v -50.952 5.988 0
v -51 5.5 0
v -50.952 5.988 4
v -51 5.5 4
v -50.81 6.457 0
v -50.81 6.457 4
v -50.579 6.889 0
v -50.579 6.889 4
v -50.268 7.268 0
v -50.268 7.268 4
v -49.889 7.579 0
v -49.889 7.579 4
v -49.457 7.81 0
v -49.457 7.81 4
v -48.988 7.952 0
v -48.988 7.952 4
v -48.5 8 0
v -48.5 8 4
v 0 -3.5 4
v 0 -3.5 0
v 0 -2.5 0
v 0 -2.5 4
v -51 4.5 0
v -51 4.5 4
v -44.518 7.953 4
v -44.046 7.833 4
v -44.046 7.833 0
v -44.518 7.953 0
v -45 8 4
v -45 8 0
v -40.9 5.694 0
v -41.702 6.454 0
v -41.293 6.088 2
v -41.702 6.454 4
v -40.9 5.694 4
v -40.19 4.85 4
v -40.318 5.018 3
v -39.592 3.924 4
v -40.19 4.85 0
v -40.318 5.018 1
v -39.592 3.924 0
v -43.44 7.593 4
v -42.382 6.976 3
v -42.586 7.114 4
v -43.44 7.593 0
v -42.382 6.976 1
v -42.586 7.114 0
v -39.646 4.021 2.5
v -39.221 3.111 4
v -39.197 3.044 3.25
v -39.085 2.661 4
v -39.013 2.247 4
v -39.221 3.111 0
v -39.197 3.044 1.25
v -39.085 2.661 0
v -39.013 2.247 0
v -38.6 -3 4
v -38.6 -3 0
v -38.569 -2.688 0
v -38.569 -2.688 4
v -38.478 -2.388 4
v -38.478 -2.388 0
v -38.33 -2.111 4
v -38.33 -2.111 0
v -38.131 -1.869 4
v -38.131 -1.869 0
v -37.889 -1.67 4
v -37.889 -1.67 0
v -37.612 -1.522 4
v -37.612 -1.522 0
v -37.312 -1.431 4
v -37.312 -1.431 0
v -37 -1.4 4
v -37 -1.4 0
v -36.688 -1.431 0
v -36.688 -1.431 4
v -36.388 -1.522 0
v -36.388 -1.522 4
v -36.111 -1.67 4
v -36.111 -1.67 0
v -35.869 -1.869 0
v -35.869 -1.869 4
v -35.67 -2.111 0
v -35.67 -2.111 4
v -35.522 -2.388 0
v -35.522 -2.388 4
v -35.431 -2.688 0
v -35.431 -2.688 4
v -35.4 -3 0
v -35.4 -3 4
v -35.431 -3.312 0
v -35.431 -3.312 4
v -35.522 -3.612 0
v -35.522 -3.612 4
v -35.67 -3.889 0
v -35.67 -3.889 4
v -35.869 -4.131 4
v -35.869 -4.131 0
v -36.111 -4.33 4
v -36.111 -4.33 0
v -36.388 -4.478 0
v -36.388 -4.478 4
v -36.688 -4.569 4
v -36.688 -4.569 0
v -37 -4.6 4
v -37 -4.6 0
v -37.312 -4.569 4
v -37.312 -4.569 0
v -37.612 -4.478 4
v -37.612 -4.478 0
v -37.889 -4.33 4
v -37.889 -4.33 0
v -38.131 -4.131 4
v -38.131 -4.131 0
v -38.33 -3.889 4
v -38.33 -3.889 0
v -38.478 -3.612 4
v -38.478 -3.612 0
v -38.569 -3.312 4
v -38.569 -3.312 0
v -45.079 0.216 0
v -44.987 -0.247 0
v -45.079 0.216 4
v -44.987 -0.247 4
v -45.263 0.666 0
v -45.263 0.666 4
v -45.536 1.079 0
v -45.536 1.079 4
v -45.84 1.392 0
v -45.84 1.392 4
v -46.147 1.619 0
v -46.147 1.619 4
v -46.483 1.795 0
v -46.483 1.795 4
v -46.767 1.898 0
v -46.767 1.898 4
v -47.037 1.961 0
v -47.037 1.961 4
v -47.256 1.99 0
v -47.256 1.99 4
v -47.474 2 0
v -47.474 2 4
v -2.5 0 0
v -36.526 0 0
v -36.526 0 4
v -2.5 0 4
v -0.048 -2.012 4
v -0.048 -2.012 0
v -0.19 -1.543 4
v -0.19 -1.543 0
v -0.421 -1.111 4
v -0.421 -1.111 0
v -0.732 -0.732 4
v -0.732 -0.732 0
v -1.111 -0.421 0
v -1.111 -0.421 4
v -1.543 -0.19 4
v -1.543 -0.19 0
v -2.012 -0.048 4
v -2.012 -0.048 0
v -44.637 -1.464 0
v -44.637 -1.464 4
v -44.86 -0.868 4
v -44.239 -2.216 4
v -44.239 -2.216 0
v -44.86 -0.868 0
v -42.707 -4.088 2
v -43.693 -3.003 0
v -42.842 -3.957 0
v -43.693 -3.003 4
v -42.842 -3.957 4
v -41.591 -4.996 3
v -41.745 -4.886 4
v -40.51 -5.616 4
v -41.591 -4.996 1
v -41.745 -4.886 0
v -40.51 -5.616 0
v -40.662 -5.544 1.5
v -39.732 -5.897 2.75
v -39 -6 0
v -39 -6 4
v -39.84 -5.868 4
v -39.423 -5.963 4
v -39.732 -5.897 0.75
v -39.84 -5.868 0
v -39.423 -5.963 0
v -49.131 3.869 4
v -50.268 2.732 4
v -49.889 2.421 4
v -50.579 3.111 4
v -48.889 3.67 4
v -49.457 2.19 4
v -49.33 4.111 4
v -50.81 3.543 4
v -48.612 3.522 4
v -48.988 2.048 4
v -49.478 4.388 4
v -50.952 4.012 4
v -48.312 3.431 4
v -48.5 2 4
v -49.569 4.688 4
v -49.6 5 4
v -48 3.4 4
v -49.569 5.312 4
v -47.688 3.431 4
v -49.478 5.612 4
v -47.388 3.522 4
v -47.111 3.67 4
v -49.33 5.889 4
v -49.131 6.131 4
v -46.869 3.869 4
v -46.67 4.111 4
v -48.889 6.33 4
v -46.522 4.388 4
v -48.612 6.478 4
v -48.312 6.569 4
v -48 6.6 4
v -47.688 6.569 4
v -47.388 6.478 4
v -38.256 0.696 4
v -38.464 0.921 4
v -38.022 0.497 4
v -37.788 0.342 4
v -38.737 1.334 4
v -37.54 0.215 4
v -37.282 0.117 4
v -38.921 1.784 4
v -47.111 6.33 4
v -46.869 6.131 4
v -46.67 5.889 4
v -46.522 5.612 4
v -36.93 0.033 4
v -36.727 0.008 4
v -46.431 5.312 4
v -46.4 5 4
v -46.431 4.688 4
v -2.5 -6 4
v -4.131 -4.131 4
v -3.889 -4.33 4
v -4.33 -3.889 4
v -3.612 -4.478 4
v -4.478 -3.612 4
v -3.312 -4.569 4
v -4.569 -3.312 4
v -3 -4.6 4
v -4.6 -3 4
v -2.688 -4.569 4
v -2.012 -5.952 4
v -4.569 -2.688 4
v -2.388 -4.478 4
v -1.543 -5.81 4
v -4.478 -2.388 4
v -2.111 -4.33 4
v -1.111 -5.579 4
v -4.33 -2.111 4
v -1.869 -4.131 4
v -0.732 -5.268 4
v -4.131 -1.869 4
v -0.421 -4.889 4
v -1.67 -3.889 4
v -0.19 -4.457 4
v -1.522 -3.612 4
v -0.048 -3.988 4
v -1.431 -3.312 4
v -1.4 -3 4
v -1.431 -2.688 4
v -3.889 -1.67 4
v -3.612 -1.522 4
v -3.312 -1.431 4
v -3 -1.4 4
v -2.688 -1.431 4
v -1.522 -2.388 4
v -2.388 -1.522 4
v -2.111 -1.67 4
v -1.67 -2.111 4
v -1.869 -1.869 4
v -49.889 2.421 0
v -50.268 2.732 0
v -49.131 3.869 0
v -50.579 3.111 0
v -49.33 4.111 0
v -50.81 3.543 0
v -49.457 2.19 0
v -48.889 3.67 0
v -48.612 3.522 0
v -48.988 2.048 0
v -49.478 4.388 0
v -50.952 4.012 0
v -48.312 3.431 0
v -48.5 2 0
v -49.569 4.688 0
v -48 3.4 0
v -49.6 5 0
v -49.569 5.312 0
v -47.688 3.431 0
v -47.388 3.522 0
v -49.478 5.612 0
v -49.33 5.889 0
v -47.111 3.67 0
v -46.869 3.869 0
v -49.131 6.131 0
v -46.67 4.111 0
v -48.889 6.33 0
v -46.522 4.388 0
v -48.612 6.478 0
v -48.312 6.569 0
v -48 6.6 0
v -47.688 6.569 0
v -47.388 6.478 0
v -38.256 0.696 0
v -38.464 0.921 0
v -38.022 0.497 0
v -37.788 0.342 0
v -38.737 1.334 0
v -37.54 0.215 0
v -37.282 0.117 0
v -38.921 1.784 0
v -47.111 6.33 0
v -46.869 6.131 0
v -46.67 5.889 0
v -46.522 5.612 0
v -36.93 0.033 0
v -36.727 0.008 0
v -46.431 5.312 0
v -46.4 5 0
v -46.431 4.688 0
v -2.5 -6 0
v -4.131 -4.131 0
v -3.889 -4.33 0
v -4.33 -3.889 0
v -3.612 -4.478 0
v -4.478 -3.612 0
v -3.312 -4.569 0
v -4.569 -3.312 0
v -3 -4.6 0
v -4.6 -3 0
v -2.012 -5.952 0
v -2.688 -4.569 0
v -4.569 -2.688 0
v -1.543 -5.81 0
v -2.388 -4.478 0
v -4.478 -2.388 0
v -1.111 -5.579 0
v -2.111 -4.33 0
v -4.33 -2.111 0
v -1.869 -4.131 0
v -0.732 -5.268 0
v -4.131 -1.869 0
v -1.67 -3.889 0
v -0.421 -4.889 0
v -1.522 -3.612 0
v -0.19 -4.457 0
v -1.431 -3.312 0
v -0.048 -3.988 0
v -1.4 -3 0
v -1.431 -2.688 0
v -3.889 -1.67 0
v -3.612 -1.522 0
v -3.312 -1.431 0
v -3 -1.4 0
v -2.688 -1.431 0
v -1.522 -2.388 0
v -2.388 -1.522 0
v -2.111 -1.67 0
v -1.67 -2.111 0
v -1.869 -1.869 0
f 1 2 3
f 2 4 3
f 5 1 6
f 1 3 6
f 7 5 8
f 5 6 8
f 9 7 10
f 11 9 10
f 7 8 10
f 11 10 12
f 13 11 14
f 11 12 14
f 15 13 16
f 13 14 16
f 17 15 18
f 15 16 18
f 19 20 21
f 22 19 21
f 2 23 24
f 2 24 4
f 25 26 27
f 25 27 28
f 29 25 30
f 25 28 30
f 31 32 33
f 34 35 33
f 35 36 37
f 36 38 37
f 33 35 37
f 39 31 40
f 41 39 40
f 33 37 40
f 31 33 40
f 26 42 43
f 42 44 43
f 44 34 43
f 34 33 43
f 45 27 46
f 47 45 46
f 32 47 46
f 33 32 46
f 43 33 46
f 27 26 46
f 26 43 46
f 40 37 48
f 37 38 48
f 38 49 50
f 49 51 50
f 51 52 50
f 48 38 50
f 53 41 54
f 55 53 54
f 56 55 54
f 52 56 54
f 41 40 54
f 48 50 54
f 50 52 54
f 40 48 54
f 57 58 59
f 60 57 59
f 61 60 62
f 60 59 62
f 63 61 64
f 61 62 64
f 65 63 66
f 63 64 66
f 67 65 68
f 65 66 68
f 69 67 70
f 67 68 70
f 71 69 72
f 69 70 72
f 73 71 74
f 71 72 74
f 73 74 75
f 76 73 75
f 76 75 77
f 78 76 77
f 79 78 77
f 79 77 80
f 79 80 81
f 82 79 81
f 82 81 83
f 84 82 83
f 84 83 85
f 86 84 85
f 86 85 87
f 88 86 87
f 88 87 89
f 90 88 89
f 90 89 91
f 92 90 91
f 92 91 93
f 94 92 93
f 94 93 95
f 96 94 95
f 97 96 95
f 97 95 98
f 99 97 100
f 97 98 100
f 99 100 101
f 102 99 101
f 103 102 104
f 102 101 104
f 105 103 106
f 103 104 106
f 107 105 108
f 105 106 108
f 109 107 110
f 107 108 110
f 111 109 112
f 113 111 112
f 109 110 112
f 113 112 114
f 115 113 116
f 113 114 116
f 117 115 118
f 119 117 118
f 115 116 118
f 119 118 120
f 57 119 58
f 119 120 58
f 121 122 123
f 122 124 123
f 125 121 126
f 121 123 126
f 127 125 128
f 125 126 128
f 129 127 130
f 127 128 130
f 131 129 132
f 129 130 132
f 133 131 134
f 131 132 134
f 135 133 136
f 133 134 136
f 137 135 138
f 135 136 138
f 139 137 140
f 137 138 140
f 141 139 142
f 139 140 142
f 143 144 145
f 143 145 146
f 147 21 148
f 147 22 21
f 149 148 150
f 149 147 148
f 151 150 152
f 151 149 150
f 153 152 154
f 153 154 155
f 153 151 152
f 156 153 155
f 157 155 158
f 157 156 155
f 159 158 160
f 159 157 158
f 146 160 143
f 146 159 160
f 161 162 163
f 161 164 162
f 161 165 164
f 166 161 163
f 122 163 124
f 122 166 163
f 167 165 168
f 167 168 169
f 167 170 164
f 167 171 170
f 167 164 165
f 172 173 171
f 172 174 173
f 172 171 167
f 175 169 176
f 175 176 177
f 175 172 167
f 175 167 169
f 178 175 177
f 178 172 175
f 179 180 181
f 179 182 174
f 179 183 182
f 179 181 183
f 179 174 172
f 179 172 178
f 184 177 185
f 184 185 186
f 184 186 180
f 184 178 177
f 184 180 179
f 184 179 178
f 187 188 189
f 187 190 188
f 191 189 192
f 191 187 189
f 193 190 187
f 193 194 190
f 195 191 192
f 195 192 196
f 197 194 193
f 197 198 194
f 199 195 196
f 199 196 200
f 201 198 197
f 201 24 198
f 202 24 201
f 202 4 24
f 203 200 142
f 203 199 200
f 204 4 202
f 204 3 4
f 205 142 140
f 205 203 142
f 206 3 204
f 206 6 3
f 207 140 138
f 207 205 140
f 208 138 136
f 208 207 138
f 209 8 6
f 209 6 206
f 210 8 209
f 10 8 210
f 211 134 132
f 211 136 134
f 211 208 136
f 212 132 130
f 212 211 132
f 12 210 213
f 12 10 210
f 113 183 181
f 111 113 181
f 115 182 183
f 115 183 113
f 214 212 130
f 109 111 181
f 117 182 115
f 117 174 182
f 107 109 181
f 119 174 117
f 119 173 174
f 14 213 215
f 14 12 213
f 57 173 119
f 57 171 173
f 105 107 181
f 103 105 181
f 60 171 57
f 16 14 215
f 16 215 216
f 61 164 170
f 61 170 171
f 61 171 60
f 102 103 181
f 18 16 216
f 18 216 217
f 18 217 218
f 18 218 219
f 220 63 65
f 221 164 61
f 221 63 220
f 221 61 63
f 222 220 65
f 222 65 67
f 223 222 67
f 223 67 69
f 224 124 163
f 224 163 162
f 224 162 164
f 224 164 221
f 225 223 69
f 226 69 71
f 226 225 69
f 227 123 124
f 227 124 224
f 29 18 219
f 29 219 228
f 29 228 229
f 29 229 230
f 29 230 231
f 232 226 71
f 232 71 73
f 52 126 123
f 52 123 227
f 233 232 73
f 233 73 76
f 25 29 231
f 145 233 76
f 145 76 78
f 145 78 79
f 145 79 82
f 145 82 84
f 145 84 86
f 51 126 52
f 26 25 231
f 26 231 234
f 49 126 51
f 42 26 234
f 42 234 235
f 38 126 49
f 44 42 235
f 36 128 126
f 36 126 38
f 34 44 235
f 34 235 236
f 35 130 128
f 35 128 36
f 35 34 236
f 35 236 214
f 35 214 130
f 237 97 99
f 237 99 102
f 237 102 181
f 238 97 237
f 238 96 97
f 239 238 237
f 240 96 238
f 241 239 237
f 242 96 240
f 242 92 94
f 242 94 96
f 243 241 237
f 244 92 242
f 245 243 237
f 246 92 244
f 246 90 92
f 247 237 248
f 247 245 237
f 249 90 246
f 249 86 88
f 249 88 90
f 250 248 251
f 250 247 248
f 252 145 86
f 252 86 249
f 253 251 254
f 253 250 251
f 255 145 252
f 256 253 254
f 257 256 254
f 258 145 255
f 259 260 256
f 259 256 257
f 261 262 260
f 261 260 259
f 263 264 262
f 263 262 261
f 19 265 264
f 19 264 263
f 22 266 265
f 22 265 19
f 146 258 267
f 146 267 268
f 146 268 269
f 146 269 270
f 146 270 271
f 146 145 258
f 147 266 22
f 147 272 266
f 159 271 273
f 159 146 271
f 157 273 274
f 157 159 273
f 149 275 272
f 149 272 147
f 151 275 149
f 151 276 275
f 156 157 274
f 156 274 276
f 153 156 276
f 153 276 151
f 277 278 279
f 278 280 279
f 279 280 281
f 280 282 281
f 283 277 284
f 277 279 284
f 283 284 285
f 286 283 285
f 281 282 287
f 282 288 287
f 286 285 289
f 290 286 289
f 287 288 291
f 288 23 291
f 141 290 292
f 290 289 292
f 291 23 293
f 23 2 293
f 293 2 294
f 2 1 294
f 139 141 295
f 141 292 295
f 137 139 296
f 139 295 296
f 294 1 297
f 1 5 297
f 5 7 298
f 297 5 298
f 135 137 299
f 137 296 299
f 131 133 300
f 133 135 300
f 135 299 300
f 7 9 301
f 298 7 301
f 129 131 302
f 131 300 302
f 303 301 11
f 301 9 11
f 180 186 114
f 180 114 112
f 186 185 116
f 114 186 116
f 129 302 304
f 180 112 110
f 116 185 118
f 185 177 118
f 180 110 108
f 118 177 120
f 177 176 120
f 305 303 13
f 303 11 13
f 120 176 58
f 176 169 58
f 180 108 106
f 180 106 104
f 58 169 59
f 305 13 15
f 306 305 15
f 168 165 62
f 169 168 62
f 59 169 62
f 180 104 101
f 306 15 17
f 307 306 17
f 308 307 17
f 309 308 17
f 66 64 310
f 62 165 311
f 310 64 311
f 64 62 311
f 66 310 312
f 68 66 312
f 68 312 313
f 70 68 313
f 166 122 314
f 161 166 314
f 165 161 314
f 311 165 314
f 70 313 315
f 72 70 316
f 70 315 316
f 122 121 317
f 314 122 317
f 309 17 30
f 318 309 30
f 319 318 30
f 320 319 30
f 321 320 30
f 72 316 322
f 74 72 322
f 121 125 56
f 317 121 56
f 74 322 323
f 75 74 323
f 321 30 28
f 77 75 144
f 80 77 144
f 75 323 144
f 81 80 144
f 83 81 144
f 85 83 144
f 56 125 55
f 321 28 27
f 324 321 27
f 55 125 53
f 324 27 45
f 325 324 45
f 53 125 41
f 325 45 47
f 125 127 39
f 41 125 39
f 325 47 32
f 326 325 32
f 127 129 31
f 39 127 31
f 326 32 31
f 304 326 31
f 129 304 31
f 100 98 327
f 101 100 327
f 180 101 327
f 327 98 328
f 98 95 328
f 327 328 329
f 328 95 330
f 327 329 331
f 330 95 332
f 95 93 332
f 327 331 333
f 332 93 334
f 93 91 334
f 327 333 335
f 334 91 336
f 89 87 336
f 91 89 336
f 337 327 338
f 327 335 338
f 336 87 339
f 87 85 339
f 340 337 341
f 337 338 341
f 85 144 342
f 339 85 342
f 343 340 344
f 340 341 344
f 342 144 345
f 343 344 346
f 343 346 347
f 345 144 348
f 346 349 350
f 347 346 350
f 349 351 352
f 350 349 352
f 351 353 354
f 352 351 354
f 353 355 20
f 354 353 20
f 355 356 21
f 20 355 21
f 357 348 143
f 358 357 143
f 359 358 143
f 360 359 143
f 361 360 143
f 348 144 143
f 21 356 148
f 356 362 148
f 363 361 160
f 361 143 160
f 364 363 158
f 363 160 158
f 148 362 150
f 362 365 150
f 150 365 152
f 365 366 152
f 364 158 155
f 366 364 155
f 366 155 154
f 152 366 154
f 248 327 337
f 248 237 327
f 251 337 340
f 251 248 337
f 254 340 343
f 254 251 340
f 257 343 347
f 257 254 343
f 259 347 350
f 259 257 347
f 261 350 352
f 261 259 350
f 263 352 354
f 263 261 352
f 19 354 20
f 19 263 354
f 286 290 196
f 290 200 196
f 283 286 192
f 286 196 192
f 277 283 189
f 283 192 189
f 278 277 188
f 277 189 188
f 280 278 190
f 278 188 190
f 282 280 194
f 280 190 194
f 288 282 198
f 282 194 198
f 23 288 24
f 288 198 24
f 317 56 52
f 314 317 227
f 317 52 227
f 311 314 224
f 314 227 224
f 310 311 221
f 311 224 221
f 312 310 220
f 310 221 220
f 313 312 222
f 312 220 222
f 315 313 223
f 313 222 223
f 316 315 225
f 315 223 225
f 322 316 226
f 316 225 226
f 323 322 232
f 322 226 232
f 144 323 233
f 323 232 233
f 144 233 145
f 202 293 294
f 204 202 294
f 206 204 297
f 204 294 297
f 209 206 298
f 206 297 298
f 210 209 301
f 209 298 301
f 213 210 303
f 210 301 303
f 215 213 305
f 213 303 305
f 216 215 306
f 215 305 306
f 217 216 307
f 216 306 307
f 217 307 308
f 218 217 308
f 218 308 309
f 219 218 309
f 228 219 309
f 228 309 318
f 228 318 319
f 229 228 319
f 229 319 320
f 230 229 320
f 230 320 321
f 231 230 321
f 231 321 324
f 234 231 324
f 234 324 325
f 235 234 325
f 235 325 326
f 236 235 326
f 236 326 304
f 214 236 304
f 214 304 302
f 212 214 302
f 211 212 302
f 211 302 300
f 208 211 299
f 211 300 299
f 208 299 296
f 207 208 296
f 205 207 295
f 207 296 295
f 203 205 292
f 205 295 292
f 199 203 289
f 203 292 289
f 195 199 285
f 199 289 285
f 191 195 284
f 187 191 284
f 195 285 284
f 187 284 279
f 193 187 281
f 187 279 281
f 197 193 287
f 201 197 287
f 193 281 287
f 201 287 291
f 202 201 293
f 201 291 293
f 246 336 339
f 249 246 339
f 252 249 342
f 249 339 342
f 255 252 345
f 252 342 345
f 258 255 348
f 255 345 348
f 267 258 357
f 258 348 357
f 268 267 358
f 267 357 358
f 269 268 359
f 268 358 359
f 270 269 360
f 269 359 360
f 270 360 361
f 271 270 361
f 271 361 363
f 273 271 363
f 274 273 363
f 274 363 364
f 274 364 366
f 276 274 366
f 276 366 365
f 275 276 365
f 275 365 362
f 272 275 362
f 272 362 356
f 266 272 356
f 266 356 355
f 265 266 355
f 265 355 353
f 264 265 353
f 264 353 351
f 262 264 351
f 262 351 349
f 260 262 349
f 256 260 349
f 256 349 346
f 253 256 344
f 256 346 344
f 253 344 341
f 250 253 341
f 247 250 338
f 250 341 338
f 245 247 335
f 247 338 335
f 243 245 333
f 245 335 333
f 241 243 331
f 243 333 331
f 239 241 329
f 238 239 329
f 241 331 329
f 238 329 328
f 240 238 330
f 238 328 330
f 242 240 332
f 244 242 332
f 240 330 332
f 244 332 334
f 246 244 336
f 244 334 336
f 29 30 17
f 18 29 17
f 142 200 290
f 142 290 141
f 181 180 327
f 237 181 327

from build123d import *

# Parameters (mm, degrees)
SKETCH1_W           = 45
SKETCH1_H           = 6
SKETCH1_W_2         = 6
BOSS_EXTRUDE1_DEPTH = 4
SKETCH2_R           = 1.6
CUT_EXTRUDE1_DEPTH  = 52.778373864
FILLET2_SIZE        = 6
FILLET3_R           = 2.5


with BuildPart() as part:
    # Sketch1 → Boss-Extrude1 (new body)
    with BuildSketch(Plane.XY):
        with Locations((-22.5, -3)):
            Rectangle(SKETCH1_W, SKETCH1_H)
        Polygon((-45, 0), (-39, 0), (-39, 8), (-45, 8), (-45, 2), align=None)
        with Locations((-48, 5)):
            Rectangle(SKETCH1_W_2, SKETCH1_H)
    extrude(amount=BOSS_EXTRUDE1_DEPTH)

    # Sketch2 → Cut-Extrude1 (cut, through all)
    with BuildSketch(Plane(origin=(0, 0, 0), x_dir=(-1, 0, 0), z_dir=(0, 0, -1))):
        with Locations((3, -3)):
            Circle(SKETCH2_R)
        with Locations((37, -3)):
            Circle(SKETCH2_R)
        with Locations((48, 5)):
            Circle(SKETCH2_R)
    extrude(amount=-CUT_EXTRUDE1_DEPTH, mode=Mode.SUBTRACT)

    # Fillet2
    # a fillet whose section is not a circle: 6 mm, written as the material it takes off along each edge
    with BuildSketch(Plane(origin=(-45, -6, -15), x_dir=(1, 0, 0), z_dir=(0, 0, 1))) as fillet2_piece_1:
        with BuildLine():
            Bezier((FILLET2_SIZE, 0), (0, 0), (0, FILLET2_SIZE), weights=[1, 0.428571429, 1])
            Line((0, FILLET2_SIZE), (0, 0))
            Line((0, 0), (FILLET2_SIZE, 0))
        make_face()
    extrude(amount=34, mode=Mode.SUBTRACT)
    with BuildSketch(Plane(origin=(-39, 8, -15), x_dir=(0, -1, 0), z_dir=(0, 0, 1))) as fillet2_piece_2:
        with BuildLine():
            Bezier((FILLET2_SIZE, 0), (0, 0), (0, -FILLET2_SIZE), weights=[1, 0.428571429, 1])
            Line((0, -FILLET2_SIZE), (0, 0))
            Line((0, 0), (FILLET2_SIZE, 0))
        make_face()
    extrude(amount=34, mode=Mode.SUBTRACT)

    # Fillet3
    fillet3_edges = [part.edges().sort_by_distance(p)[0] for p in [
        (-51, 8, 2),
        (-51, 2, 2),
        (-45, 2, 2),
        (-39, 0, 2),
        (0, 0, 2),
        (0, -6, 2),
    ]]
    fillet(fillet3_edges, radius=FILLET3_R)


solid = part.part
